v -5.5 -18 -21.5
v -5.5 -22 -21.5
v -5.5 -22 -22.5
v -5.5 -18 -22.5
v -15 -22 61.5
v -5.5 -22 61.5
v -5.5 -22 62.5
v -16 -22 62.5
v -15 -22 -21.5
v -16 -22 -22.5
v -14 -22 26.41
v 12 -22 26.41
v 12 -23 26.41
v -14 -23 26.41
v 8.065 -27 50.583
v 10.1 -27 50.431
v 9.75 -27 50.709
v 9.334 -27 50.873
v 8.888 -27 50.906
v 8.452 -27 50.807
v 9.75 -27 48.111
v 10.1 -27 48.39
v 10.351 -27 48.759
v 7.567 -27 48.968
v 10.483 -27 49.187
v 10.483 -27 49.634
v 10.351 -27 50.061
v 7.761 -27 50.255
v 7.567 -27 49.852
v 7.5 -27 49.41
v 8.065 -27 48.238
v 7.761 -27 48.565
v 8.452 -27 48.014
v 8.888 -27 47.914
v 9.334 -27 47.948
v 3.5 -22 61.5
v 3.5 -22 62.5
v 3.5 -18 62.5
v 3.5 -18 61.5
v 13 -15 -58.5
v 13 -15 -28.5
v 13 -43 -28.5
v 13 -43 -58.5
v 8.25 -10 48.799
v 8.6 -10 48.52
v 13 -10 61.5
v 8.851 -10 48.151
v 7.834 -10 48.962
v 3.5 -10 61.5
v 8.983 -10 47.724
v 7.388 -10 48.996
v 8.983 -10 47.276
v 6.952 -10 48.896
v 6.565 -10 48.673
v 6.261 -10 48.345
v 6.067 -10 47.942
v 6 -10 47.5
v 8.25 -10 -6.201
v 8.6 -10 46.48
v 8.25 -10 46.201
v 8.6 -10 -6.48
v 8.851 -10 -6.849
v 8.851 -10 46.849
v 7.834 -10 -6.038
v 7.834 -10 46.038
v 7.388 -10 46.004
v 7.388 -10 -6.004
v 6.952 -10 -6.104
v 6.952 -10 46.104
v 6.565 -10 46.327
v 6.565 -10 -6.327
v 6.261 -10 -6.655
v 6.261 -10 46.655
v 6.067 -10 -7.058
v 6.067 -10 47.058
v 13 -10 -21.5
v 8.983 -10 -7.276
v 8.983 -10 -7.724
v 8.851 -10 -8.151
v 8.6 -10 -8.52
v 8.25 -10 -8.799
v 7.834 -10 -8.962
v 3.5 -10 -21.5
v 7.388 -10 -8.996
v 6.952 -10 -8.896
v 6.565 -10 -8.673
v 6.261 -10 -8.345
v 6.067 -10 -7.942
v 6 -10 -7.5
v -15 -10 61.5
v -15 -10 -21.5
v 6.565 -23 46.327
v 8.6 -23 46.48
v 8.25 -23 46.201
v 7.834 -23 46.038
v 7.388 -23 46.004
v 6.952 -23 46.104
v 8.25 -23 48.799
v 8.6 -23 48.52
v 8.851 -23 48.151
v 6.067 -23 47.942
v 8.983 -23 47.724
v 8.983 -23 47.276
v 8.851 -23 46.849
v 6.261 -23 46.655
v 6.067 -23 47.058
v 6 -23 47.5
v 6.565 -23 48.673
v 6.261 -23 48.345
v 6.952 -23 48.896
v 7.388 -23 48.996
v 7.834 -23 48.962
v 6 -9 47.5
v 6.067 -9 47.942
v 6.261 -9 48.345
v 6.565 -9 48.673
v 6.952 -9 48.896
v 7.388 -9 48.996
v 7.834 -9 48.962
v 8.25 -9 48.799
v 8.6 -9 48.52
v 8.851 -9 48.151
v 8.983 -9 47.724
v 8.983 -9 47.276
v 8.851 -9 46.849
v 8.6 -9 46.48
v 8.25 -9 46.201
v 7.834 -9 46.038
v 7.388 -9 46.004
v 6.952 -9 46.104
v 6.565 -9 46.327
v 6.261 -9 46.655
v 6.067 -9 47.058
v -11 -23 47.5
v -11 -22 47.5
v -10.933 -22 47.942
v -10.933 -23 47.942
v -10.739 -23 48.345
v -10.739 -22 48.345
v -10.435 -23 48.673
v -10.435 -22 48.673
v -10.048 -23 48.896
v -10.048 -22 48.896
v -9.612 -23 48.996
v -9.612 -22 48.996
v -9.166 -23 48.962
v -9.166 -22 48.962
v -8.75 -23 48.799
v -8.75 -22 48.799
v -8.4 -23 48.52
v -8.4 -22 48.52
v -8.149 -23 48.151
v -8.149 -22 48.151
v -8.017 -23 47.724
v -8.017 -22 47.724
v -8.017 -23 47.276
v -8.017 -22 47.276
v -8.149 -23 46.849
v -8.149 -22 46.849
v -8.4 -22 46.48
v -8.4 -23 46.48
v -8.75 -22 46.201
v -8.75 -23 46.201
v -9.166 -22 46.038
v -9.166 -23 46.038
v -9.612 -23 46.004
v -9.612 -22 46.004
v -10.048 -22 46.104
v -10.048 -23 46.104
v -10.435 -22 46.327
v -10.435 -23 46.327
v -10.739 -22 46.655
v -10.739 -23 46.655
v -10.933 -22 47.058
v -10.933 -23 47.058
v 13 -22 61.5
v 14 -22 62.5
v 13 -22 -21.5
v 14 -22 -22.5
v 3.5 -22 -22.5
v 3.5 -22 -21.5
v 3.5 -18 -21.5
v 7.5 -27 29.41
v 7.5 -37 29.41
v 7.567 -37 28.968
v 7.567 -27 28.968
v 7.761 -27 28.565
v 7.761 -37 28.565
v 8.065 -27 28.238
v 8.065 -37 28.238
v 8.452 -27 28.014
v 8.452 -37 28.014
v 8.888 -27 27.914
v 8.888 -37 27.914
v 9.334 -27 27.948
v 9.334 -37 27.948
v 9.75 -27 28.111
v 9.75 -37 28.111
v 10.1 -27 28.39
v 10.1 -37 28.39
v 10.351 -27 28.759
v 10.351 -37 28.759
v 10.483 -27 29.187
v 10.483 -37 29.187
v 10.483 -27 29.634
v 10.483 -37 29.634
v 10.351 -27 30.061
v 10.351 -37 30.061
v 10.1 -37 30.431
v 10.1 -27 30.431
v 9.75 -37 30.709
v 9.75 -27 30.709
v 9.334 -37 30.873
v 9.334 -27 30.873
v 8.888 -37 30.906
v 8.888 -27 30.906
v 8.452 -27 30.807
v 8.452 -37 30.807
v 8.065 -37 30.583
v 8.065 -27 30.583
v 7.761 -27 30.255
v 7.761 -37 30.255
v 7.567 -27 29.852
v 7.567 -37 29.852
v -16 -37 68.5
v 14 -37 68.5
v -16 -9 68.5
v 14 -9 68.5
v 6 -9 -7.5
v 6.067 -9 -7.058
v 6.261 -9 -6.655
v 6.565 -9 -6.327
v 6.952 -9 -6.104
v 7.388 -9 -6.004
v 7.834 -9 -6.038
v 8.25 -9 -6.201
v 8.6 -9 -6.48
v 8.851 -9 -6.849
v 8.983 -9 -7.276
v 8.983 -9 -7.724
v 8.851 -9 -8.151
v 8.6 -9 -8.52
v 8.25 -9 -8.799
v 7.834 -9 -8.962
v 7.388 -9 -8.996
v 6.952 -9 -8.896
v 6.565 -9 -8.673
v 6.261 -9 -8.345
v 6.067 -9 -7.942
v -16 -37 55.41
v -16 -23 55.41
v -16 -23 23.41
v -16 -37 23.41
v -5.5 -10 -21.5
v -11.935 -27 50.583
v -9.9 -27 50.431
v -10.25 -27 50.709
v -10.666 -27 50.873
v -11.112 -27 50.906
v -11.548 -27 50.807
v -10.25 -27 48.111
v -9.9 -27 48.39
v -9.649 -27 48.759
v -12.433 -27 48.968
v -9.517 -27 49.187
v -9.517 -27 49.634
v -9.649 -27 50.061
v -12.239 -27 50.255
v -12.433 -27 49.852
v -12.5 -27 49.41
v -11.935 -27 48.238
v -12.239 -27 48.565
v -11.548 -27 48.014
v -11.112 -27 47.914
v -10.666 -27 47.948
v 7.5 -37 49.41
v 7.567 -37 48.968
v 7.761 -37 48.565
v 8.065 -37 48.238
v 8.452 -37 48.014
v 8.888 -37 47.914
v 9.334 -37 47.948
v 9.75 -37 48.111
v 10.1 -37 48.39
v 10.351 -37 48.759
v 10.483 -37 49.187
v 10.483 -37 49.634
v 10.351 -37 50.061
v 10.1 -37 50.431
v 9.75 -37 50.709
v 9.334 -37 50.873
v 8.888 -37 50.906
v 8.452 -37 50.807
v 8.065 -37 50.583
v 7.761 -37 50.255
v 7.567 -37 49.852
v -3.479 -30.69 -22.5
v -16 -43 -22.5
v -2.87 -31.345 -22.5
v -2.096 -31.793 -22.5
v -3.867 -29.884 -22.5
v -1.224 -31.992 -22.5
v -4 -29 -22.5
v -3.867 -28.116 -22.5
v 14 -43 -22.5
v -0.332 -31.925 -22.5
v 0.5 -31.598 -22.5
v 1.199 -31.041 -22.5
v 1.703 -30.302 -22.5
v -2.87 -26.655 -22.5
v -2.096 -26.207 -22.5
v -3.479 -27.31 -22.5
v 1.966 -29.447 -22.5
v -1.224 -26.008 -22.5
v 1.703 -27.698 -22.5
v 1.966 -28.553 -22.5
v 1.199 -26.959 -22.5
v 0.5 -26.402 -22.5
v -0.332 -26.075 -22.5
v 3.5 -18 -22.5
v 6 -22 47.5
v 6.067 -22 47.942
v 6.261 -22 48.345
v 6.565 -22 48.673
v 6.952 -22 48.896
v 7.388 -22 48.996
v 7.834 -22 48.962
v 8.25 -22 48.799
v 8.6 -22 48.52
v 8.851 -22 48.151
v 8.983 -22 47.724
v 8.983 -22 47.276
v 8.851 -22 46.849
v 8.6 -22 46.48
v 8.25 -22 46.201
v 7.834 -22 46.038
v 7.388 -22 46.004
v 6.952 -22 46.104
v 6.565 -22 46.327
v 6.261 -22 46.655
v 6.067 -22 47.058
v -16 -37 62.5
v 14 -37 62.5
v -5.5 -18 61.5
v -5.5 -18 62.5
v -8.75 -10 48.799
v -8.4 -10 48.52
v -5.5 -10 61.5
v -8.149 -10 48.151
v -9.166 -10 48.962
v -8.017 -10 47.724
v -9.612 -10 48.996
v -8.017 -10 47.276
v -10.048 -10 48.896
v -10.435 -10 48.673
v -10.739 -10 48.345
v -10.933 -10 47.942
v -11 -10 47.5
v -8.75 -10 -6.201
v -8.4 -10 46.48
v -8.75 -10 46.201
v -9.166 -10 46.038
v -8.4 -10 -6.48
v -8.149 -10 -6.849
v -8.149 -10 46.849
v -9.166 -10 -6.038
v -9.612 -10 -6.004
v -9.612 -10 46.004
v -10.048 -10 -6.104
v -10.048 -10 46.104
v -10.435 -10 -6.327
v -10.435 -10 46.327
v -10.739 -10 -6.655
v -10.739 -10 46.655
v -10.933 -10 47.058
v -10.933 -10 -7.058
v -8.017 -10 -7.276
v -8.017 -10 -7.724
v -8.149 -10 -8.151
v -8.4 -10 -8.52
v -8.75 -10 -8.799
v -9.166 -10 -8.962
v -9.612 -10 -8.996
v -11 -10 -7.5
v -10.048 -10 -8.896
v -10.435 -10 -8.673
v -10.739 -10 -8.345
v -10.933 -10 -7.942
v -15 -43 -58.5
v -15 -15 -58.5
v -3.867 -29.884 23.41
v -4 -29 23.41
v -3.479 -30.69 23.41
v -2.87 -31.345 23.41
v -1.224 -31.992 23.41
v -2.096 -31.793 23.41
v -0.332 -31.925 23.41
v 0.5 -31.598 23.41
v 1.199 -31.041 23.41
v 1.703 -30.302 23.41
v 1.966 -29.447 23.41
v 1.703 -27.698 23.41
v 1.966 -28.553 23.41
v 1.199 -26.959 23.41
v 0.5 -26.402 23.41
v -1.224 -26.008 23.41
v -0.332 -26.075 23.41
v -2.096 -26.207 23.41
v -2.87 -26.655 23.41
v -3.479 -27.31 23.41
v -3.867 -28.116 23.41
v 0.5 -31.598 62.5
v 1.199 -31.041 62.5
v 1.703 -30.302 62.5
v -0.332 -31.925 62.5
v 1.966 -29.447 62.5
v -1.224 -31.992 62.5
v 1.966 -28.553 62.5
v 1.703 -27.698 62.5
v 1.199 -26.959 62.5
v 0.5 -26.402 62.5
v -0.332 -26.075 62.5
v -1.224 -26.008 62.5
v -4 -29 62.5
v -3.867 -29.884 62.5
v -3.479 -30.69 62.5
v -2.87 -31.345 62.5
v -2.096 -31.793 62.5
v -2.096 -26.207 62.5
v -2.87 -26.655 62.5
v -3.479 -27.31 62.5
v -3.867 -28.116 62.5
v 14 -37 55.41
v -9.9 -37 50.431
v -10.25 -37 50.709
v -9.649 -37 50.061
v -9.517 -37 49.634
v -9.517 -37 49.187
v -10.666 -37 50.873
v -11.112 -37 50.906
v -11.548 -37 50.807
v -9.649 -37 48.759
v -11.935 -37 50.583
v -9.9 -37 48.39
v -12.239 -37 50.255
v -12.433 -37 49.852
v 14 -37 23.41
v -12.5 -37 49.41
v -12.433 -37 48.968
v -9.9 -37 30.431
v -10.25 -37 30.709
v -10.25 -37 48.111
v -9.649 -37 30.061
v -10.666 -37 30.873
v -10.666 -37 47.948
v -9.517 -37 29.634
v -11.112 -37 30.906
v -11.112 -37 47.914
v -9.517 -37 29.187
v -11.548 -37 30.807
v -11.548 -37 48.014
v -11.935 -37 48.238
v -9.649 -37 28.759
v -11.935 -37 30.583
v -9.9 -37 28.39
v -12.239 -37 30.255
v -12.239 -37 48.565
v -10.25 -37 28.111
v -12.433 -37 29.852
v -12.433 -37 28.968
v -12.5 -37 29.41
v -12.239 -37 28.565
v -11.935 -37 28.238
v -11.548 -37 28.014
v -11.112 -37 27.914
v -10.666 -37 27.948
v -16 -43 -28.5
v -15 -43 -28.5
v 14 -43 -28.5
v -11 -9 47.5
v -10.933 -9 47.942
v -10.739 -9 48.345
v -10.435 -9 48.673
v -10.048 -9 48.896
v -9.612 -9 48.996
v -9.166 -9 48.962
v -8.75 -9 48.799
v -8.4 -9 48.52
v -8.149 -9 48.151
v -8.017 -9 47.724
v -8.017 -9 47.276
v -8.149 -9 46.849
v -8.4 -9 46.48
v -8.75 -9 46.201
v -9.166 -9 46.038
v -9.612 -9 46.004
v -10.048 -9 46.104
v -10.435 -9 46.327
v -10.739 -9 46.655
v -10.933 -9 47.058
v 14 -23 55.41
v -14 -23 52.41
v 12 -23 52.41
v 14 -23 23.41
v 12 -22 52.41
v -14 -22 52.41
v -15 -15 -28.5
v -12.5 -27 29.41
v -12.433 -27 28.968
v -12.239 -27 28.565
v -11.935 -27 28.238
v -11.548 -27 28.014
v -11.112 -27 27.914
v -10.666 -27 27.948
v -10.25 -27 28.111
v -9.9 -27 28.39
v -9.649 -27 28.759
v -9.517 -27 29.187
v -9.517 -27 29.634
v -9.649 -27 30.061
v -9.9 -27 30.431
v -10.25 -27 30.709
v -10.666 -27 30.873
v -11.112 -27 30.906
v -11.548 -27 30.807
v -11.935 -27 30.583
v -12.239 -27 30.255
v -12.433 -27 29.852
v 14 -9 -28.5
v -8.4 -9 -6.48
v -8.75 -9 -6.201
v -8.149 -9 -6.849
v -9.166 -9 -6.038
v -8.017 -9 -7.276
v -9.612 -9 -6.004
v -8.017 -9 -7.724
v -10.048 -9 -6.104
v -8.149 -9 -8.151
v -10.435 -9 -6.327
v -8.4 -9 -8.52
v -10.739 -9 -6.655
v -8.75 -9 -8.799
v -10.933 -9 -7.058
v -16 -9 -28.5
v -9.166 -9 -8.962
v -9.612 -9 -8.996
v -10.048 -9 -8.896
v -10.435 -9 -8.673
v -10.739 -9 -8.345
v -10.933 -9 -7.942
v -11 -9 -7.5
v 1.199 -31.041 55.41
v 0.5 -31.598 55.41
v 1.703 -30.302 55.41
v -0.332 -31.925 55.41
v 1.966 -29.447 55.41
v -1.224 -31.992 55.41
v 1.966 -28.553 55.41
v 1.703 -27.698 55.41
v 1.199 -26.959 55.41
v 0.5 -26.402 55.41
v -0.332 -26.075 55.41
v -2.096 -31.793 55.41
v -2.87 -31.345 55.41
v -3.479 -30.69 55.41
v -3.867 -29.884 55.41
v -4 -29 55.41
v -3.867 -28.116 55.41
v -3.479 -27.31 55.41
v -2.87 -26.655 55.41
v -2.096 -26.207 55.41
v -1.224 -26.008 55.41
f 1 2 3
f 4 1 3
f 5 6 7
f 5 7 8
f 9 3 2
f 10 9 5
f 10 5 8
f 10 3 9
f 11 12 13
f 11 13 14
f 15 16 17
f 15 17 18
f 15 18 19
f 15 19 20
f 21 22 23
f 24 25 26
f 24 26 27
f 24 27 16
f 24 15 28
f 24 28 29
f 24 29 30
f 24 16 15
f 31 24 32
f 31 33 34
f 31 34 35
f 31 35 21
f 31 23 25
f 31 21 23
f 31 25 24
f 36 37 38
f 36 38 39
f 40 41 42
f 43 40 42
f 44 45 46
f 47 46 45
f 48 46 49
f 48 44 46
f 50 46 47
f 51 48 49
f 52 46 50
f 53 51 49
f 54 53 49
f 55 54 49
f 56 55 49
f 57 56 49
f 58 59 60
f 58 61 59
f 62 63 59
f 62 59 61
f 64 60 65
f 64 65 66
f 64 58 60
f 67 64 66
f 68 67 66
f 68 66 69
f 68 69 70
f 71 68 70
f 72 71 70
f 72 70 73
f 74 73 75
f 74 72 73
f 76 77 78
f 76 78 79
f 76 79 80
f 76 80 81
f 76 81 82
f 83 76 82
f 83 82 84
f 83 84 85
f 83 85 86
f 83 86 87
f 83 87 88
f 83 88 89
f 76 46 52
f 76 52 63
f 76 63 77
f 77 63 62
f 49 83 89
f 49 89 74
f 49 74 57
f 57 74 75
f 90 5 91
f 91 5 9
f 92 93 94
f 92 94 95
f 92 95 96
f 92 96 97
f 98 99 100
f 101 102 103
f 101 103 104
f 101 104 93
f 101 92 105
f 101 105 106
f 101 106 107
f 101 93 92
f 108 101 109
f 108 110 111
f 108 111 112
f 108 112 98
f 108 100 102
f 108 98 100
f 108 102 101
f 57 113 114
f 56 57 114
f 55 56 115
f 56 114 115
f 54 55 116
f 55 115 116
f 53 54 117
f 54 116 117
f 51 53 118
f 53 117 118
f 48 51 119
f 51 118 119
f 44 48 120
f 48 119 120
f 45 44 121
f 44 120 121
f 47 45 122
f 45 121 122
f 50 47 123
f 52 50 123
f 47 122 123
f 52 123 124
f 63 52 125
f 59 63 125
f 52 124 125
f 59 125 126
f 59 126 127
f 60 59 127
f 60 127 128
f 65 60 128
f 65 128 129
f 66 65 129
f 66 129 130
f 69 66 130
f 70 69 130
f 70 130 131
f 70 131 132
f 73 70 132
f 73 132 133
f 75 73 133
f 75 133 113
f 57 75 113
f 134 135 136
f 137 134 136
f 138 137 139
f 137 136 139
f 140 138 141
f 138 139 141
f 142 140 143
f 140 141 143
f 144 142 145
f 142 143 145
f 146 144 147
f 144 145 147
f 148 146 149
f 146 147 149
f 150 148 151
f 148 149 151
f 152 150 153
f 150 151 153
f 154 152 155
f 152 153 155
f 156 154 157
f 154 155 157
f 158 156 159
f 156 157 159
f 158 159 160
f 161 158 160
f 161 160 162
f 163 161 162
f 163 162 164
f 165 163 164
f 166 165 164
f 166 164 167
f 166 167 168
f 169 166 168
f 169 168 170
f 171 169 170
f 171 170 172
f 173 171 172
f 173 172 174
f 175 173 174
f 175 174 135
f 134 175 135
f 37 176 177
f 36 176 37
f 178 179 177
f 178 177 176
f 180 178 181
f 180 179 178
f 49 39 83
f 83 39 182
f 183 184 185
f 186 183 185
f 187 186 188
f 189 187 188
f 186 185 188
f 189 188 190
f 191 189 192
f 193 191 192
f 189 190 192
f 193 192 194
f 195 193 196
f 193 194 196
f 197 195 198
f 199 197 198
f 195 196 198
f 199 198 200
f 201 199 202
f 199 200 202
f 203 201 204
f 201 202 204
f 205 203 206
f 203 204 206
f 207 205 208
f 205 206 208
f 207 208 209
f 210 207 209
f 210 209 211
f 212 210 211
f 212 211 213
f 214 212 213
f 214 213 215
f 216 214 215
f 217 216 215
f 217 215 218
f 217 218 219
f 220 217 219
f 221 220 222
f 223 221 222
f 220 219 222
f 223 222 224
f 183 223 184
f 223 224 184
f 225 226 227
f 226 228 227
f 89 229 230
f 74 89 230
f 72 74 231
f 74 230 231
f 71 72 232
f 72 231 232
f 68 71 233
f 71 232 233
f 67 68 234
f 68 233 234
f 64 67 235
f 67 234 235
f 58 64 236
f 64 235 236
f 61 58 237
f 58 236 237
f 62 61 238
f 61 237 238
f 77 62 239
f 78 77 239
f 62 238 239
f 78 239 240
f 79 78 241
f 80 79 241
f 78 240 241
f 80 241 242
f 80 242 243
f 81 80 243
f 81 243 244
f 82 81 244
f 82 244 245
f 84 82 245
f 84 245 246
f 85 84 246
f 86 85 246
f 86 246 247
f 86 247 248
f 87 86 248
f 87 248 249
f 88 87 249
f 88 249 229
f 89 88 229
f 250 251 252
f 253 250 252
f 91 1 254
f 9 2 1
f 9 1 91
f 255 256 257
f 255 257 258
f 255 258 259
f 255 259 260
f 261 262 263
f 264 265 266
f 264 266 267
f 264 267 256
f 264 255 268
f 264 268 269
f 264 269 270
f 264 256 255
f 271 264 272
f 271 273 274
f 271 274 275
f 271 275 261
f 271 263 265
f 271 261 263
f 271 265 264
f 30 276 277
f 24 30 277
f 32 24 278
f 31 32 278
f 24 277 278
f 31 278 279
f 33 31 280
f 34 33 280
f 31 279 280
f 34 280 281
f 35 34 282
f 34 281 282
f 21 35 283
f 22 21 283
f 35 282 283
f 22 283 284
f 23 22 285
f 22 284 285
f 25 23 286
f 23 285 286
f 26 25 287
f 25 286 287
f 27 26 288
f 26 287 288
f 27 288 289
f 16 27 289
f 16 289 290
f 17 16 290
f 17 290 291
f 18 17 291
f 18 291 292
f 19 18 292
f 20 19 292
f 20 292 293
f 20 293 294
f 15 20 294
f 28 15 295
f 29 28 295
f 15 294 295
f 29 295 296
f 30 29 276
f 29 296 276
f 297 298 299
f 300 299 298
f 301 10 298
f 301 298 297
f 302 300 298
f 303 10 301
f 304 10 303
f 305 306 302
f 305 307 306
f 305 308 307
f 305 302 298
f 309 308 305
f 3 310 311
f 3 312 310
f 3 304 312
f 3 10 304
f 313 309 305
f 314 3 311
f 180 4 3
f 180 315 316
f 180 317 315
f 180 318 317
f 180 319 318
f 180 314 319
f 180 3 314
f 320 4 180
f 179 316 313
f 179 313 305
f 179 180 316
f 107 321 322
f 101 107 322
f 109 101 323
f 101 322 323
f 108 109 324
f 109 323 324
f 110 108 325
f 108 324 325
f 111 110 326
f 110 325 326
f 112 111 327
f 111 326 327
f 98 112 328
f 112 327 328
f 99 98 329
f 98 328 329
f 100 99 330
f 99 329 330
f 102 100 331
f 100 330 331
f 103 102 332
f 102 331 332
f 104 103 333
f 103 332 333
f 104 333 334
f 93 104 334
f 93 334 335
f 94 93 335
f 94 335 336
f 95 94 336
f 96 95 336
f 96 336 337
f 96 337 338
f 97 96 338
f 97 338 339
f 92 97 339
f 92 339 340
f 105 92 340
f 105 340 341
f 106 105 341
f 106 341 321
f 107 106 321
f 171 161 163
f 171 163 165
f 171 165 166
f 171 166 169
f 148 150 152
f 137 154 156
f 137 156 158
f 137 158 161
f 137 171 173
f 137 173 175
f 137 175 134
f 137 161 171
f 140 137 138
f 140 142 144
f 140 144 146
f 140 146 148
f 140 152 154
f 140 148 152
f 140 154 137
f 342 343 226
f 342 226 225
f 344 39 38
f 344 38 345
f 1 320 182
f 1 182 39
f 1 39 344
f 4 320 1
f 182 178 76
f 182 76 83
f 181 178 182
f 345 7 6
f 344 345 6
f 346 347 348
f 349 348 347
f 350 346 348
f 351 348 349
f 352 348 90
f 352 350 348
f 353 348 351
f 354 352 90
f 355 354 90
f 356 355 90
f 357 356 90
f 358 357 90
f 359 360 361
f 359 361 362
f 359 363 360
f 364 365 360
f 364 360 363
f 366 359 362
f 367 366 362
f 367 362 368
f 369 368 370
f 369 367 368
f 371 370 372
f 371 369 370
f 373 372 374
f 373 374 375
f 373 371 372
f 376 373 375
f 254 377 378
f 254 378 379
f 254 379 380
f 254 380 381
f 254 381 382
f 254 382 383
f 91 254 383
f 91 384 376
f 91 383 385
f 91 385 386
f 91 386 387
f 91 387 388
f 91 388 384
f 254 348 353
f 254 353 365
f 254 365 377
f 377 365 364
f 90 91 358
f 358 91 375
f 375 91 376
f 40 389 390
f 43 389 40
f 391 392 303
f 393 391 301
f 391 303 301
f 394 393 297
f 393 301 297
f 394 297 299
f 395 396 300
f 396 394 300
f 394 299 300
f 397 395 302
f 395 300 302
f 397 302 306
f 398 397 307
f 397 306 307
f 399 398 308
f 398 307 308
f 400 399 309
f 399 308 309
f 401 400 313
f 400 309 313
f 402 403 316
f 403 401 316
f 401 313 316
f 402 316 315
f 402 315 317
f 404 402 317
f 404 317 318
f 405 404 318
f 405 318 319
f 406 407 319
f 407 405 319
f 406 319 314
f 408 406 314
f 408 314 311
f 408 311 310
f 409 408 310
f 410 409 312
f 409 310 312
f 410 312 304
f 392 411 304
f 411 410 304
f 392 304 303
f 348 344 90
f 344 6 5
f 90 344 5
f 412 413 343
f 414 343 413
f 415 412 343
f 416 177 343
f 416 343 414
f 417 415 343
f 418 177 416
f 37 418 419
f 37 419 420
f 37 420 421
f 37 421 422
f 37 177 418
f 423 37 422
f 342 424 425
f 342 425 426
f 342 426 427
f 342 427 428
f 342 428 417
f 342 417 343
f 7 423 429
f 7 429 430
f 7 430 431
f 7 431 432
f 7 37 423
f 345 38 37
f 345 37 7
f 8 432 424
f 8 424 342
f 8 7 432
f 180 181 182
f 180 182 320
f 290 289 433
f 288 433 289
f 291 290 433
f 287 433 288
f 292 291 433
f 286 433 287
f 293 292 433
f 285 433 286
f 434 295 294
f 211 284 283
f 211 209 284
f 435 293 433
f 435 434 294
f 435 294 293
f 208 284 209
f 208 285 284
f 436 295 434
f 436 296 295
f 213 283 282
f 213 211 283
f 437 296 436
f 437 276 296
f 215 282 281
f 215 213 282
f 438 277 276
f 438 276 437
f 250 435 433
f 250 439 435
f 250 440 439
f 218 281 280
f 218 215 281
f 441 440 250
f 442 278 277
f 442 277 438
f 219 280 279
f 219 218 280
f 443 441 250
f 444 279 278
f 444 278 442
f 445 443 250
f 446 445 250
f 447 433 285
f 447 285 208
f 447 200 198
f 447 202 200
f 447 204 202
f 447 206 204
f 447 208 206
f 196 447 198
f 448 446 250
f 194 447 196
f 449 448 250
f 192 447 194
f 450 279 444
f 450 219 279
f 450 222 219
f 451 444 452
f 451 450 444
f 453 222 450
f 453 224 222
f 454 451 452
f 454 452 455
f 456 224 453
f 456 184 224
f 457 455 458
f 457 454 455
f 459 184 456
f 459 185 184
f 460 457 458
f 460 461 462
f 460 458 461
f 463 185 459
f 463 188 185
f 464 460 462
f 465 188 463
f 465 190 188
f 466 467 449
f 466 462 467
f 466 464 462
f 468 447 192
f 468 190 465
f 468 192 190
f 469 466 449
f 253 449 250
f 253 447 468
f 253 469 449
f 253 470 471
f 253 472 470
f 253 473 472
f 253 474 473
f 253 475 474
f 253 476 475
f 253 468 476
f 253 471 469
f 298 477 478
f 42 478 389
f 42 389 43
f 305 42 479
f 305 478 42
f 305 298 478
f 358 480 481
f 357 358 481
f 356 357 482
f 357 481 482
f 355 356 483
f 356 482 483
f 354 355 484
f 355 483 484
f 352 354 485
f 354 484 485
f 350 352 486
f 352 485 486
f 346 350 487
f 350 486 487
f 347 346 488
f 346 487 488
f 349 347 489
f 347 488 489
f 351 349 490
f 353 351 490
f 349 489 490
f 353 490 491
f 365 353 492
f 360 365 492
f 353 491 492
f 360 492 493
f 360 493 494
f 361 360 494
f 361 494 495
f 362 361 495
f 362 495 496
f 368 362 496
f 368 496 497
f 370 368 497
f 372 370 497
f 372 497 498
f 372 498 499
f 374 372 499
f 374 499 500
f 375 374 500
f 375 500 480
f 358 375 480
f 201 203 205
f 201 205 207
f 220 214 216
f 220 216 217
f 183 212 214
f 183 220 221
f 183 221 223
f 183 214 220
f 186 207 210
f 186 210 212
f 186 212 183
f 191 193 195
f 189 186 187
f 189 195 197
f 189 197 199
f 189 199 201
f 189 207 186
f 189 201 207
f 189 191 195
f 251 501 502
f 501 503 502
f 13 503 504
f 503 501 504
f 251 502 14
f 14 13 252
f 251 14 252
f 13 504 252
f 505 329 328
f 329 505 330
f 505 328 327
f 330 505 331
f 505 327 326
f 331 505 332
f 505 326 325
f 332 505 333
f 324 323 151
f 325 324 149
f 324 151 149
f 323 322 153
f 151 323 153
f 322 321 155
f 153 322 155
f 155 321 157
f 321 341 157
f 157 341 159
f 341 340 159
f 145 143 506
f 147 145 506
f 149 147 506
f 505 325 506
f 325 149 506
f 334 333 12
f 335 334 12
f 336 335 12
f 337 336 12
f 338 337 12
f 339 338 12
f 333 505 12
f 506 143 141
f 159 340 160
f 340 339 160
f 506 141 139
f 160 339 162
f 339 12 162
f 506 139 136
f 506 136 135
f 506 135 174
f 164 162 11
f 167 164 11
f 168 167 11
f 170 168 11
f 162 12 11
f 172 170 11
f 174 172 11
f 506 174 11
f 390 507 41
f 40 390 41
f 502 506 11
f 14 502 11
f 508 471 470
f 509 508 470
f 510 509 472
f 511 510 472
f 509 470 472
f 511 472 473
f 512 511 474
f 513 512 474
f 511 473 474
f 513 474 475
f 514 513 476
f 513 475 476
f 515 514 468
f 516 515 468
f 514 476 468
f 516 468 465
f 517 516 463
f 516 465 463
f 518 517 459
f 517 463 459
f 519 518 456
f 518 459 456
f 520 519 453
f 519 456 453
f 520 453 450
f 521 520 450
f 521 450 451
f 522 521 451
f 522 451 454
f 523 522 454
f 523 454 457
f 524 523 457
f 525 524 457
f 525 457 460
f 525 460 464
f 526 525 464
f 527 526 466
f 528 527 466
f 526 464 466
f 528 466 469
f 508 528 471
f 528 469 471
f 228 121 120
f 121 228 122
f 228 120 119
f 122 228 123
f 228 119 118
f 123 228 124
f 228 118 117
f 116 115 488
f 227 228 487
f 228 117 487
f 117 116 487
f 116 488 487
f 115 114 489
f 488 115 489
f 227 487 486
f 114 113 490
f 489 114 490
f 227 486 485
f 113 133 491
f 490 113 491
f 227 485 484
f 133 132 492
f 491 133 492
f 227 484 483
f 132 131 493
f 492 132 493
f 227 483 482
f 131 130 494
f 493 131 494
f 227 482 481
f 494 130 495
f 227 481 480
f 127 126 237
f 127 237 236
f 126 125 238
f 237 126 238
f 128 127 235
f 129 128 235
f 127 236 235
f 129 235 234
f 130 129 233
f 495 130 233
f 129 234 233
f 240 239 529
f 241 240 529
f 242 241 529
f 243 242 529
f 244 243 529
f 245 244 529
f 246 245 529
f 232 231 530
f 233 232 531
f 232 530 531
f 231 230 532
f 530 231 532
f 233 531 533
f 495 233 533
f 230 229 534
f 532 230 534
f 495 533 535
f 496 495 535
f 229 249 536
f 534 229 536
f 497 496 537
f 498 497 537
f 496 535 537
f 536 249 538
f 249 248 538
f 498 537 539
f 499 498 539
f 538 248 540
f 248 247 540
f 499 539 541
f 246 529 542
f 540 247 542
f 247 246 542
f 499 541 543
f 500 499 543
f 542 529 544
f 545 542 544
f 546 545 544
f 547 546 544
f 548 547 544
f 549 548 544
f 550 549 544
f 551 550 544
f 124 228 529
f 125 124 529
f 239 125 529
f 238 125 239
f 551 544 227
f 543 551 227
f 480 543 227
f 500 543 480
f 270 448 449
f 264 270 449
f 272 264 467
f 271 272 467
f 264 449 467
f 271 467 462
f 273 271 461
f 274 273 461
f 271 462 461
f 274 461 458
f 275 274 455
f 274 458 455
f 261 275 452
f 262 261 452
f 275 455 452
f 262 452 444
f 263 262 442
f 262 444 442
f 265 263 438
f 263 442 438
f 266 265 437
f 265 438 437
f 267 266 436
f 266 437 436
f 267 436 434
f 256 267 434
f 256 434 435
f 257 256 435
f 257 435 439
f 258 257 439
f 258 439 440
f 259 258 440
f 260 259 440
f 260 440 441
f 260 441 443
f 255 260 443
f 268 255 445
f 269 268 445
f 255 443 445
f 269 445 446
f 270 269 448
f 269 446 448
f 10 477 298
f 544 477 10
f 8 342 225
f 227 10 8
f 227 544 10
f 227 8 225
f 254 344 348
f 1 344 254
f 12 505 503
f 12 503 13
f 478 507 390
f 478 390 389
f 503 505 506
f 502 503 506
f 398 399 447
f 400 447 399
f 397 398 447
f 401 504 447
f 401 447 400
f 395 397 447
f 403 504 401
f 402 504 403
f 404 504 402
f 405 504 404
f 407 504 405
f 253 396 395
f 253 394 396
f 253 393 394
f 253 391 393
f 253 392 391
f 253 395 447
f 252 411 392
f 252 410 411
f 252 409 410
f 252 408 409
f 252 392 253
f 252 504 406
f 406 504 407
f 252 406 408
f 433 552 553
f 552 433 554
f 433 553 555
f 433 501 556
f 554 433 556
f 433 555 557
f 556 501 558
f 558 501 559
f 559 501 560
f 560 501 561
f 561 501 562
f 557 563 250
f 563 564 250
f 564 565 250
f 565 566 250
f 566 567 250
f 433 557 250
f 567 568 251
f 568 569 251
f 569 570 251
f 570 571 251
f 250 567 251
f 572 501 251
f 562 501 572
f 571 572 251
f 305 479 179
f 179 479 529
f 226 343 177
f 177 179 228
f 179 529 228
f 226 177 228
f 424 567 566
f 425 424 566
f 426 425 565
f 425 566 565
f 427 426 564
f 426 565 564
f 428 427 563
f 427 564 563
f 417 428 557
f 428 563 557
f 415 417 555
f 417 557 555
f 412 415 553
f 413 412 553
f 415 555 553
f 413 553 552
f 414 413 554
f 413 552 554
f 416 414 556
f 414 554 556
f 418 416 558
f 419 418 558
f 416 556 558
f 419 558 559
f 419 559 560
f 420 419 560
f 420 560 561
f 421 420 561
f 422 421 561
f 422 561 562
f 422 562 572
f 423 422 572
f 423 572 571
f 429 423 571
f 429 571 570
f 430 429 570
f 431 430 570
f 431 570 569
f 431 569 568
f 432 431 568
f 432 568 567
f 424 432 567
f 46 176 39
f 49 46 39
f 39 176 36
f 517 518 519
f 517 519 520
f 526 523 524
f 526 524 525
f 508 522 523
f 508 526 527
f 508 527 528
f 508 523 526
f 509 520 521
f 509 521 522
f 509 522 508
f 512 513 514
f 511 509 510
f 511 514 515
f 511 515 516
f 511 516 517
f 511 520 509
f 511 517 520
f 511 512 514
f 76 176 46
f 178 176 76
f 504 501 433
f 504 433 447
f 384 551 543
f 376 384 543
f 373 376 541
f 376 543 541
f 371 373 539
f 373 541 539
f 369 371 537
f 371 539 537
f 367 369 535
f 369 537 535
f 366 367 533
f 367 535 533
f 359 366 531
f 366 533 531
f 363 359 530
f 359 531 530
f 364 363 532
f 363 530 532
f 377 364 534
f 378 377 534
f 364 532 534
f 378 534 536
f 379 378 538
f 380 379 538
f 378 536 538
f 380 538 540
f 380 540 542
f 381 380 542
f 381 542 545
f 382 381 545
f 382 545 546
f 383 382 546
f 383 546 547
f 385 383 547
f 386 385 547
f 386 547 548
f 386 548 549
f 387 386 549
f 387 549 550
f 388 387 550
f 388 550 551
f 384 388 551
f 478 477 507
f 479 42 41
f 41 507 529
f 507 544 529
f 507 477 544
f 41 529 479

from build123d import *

# Parameters (mm, degrees)
SKETCH_W                = 30
SKETCH_H                = 97
PAD_DEPTH               = 13
SKETCH001_W             = 30
SKETCH001_H             = 6
PAD001_DEPTH            = 15
PAD001_FACE5_W          = 30
PAD001_FACE5_H          = 6
PAD002_DEPTH            = 6
SKETCH002_W             = 28
SKETCH002_H             = 28
PAD003_DEPTH            = 30
SKETCH003_W             = 26
SKETCH003_H             = 26
PAD004_DEPTH            = 1
SKETCH004_W             = 30
SKETCH004_H             = 32
PAD005_DEPTH            = 14
SKETCH005_R             = 1.5
POCKET_DEPTH            = 10
SKETCH006_R             = 3
PAD006_DEPTH            = 85
SKETCH007_W             = 9
SKETCH007_H             = 85
POCKET001_DEPTH         = 4
SKETCH008_R             = 1.5
POCKET002_DEPTH         = 14
SKETCH028_W             = 9.5
SKETCH028_H             = 83
POCKET007_DEPTH         = 12
SKETCH029_W             = 9.5
SKETCH029_H             = 83
POCKET008_DEPTH         = 12
BODY001_PLACEMENT_ANGLE = 180


with BuildPart() as part:
    # Sketch → Pad (new body)
    with BuildSketch(Plane.XZ):
        Rectangle(SKETCH_W, SKETCH_H)
    extrude(amount=PAD_DEPTH)

    # Sketch001 (on Face6 of Pad) → Pad001 (join)
    with BuildSketch(Plane.XZ.offset(13)):
        with Locations((0, -45.5)):
            Rectangle(SKETCH001_W, SKETCH001_H)
        with Locations((0, 45.5)):
            Rectangle(SKETCH001_W, SKETCH001_H)
    extrude(amount=PAD001_DEPTH)

    # Pad001 Face5 → Pad002 (add)
    with BuildSketch(Plane(origin=(0, -28, 45.5), x_dir=(-1, 0, 0), z_dir=(0, -1, 0))):
        Rectangle(PAD001_FACE5_W, PAD001_FACE5_H)
    extrude(amount=PAD002_DEPTH)

    # Sketch002 (on Face8 of Pad002) → Pad003 (join)
    with BuildSketch(Plane(origin=(0, 0, 48.5), x_dir=(-1, 0, 0), z_dir=(0, 0, 1))):
        with Locations((0, 20)):
            Rectangle(SKETCH002_W, SKETCH002_H)
    extrude(amount=PAD003_DEPTH)

    # Sketch003 (on Face1 of Pad003) → Pad004 (join)
    with BuildSketch(Plane.XZ.offset(13)):
        with Locations((0, -19.410291)):
            Rectangle(SKETCH003_W, SKETCH003_H)
    extrude(amount=PAD004_DEPTH)

    # Sketch004 (on Face15 of Pad004) → Pad005 (join)
    with BuildSketch(Plane.XZ.offset(14)):
        with Locations((0, -19.410291)):
            Rectangle(SKETCH004_W, SKETCH004_H)
    extrude(amount=PAD005_DEPTH)

    # Sketch005 (on Face24 of Pad005) → Pocket (cut)
    with BuildSketch(Plane.XZ.offset(28)):
        with Locations((-10, -9.410291)):
            Circle(SKETCH005_R)
        with Locations((10, -9.410291)):
            Circle(SKETCH005_R)
        with Locations((10, -29.410291)):
            Circle(SKETCH005_R)
        with Locations((-10, -29.410291)):
            Circle(SKETCH005_R)
    extrude(amount=-POCKET_DEPTH, mode=Mode.SUBTRACT)

    # Sketch006 (on Face5 of Pocket) → Pad006 (join)
    with BuildSketch(Plane(origin=(0, 0, 42.5), x_dir=(1, 0, 0), z_dir=(0, 0, -1))):
        with Locations((0, 20)):
            Circle(SKETCH006_R)
    extrude(amount=PAD006_DEPTH)

    # Sketch007 (on Face1 of Pad006) → Pocket001 (cut)
    with BuildSketch(Plane.XZ.offset(13)):
        Rectangle(SKETCH007_W, SKETCH007_H)
    extrude(amount=-POCKET001_DEPTH, mode=Mode.SUBTRACT)

    # Sketch008 (on Face8 of Pocket001) → Pocket002 (cut)
    with BuildSketch(Plane(origin=(0, 0, 0), x_dir=(1, 0, 0), z_dir=(0, 1, 0))):
        with Locations((-8.5, 27.5)):
            Circle(SKETCH008_R)
        with Locations((8.5, 27.5)):
            Circle(SKETCH008_R)
        with Locations((8.5, -27.5)):
            Circle(SKETCH008_R)
        with Locations((-8.5, -27.5)):
            Circle(SKETCH008_R)
    extrude(amount=-POCKET002_DEPTH, mode=Mode.SUBTRACT)

    # Sketch028 (on Face17 of Pocket002) → Pocket007 (cut)
    with BuildSketch(Plane.XZ.offset(13)):
        with Locations((-9.25, 0)):
            Rectangle(SKETCH028_W, SKETCH028_H)
    extrude(amount=-POCKET007_DEPTH, mode=Mode.SUBTRACT)

    # Sketch029 (on Face1 of Pocket007) → Pocket008 (cut)
    with BuildSketch(Plane.XZ.offset(13)):
        with Locations((9.25, 0)):
            Rectangle(SKETCH029_W, SKETCH029_H)
    extrude(amount=-POCKET008_DEPTH, mode=Mode.SUBTRACT)


with BuildPart() as part_1:
    # Body001 placement: moved
    add(part.part.moved(Location((-1, -9, 20))).rotate(Axis((-1, -9, 20), (0, 1, 0)), BODY001_PLACEMENT_ANGLE))


solid = part_1.part
